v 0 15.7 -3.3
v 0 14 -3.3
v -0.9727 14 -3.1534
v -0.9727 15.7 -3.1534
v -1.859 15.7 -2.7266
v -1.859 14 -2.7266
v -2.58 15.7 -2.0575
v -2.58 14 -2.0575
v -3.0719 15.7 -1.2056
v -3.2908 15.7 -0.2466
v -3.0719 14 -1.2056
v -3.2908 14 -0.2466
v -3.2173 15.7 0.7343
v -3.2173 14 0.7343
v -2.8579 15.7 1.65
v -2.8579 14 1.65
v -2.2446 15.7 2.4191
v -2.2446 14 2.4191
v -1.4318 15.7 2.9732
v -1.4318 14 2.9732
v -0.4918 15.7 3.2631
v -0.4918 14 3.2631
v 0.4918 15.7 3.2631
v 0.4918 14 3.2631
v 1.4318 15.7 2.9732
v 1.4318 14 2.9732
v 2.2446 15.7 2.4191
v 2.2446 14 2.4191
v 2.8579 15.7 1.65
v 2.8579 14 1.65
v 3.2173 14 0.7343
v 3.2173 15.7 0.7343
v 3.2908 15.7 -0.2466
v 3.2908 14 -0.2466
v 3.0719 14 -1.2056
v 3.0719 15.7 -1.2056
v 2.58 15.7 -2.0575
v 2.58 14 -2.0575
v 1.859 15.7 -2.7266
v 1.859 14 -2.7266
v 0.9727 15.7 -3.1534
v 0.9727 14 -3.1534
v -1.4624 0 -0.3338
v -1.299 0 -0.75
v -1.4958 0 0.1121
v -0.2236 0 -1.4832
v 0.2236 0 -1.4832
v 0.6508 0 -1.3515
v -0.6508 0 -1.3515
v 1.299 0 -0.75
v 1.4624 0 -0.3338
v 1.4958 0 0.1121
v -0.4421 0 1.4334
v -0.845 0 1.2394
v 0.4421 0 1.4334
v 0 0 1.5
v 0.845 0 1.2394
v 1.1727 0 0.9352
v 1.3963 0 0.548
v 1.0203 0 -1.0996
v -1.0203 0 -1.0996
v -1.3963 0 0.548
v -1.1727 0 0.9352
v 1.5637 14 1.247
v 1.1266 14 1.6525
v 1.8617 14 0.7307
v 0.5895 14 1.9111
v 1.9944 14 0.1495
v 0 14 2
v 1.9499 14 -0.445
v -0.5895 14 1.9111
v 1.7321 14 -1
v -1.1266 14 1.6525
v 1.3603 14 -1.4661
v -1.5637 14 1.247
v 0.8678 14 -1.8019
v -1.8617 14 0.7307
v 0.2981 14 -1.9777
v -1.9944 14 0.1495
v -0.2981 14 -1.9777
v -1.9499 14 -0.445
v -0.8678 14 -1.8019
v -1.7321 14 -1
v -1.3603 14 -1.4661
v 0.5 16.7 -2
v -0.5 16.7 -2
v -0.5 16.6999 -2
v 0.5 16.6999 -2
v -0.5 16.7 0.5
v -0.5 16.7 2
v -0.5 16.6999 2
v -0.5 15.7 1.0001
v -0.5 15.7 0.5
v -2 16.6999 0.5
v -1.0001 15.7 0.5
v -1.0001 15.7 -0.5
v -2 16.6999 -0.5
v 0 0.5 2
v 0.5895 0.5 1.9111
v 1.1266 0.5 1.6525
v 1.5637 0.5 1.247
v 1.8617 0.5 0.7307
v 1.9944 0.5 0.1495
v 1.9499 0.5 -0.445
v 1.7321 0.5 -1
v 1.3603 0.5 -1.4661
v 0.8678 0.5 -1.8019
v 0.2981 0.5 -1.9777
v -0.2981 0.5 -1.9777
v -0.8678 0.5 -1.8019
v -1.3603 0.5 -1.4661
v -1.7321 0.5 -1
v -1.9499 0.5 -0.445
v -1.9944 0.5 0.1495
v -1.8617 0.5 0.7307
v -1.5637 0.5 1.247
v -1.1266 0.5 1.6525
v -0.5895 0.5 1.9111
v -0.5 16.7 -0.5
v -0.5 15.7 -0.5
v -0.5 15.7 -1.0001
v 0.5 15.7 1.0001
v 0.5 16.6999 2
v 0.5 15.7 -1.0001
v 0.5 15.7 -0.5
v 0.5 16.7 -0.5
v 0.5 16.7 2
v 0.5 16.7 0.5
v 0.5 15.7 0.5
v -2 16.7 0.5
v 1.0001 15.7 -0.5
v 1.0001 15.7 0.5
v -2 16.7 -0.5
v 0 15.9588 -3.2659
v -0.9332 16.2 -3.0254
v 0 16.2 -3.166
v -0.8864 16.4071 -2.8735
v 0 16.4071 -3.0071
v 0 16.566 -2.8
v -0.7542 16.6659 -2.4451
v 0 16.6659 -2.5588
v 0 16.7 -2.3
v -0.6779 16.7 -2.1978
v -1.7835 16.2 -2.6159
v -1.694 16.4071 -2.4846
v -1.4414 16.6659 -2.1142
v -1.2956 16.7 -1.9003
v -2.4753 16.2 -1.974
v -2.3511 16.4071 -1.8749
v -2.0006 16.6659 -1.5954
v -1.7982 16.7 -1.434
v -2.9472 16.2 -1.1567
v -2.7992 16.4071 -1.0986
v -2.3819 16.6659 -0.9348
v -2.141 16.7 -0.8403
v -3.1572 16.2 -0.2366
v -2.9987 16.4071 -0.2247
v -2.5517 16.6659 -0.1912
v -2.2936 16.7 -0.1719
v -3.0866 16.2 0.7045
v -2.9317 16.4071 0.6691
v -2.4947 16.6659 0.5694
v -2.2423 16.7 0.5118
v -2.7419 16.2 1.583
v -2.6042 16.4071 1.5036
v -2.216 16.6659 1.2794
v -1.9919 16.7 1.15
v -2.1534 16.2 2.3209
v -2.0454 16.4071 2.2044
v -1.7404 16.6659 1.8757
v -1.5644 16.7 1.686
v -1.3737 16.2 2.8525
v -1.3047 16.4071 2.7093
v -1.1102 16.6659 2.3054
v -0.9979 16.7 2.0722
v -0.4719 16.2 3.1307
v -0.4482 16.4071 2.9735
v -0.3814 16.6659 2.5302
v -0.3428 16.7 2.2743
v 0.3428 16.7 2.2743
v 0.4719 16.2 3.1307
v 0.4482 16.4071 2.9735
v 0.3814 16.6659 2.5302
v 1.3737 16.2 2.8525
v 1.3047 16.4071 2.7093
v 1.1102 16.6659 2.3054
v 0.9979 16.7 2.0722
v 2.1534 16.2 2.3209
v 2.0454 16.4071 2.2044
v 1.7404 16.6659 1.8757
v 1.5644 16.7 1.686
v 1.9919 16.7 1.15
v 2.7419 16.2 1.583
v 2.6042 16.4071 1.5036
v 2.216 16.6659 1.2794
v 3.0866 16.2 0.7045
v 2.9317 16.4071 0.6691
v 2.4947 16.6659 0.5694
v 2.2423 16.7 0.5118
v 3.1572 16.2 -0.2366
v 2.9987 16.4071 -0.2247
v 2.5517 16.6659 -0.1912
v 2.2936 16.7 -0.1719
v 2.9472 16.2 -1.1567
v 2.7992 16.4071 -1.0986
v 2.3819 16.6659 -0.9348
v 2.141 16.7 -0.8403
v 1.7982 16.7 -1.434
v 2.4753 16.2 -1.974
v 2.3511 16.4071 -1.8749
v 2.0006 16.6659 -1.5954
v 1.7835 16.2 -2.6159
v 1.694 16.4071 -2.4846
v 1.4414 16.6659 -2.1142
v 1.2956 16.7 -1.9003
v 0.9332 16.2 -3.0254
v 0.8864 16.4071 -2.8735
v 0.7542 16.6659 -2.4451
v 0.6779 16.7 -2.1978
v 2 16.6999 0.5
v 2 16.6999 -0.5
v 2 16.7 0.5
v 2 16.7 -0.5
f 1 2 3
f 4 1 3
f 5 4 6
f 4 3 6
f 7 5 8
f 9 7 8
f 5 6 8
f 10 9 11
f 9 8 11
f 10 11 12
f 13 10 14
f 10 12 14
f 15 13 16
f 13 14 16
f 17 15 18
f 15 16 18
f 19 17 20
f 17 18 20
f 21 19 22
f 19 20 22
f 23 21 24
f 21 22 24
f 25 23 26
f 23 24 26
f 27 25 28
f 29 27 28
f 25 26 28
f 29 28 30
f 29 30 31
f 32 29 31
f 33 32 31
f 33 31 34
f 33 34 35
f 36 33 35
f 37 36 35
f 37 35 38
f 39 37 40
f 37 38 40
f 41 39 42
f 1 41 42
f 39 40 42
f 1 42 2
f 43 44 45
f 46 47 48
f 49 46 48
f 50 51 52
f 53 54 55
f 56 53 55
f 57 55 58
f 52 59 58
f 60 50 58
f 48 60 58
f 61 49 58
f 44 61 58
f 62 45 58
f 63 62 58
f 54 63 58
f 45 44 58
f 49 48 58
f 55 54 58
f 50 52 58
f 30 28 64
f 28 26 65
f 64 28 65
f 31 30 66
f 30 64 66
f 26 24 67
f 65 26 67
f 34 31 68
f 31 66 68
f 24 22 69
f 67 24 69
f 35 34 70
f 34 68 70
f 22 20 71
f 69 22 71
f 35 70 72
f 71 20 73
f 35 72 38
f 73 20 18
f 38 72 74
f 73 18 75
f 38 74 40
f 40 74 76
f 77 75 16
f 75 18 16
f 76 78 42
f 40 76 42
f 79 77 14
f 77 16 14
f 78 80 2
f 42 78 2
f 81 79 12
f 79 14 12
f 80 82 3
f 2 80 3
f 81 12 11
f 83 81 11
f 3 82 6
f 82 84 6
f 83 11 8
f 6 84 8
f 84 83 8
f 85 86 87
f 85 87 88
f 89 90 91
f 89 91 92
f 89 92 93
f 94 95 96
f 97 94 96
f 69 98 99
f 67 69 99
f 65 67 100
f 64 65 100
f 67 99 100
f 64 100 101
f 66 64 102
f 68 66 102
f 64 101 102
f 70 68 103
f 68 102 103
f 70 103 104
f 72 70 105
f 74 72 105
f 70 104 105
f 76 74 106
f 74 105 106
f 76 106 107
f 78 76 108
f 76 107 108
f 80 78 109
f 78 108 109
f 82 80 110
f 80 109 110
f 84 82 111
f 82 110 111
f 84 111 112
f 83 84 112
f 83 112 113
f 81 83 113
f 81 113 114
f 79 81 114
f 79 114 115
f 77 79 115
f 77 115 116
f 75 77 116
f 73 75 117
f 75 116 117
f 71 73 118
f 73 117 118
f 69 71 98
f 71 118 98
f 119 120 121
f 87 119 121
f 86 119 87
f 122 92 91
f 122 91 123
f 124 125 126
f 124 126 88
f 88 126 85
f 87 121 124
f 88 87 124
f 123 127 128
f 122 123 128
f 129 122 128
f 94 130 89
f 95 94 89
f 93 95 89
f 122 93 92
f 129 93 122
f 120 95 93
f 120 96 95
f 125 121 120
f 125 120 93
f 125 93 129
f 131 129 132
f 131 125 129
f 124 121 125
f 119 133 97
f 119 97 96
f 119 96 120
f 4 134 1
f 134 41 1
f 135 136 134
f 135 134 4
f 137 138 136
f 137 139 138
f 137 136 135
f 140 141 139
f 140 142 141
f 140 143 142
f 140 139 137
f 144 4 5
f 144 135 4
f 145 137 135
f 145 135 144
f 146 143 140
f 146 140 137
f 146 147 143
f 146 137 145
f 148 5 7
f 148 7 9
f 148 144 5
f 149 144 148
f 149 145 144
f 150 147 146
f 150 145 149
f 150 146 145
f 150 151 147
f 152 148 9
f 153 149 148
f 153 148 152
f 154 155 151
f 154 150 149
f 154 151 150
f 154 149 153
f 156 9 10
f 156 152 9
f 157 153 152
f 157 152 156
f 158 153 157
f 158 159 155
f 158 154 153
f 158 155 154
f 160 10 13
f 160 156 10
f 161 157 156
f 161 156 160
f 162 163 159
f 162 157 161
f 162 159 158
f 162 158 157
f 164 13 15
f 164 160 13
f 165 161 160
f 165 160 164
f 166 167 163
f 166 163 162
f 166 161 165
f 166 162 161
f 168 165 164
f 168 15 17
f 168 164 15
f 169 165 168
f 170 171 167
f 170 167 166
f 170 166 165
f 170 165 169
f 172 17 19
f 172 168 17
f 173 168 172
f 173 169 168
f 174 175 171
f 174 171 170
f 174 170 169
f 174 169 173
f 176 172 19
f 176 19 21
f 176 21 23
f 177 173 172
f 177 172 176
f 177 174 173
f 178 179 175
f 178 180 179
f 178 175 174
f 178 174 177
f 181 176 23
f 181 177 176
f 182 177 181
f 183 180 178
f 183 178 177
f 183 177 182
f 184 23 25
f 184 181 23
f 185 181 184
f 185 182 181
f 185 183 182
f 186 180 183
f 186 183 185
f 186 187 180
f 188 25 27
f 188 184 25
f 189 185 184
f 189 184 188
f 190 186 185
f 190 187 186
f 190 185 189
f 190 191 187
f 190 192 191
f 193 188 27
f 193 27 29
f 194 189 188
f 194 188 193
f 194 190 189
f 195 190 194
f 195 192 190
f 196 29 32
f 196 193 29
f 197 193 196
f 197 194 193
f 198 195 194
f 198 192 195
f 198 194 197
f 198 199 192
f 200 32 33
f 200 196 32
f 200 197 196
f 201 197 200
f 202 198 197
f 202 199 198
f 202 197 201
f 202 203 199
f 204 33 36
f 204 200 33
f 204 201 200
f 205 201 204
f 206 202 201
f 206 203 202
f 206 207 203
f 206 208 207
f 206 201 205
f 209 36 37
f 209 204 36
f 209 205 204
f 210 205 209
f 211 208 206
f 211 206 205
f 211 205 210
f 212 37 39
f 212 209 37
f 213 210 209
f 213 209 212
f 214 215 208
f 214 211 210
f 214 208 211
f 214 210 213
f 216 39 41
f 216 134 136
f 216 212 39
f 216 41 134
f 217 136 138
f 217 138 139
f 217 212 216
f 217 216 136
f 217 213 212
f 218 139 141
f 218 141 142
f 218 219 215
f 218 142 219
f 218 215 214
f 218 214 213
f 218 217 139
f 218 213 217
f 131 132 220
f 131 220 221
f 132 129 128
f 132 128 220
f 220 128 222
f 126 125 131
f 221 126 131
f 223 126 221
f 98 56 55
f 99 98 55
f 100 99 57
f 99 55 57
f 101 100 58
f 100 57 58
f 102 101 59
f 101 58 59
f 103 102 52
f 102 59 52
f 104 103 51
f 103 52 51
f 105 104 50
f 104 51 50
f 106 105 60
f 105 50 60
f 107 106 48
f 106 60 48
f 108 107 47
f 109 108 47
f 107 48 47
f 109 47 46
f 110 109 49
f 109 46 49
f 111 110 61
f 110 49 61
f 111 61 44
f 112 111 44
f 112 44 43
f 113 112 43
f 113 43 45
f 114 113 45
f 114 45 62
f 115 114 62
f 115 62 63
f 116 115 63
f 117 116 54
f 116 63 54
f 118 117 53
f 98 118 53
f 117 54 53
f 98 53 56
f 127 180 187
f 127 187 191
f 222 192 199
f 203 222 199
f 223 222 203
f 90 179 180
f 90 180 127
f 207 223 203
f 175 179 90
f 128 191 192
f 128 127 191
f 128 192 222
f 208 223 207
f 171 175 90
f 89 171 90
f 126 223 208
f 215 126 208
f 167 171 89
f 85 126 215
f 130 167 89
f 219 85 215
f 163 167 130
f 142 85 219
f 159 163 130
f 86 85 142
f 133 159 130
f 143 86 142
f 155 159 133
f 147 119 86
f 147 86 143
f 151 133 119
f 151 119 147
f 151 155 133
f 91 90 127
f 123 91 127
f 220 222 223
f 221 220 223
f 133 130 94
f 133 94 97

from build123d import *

# Parameters (mm, degrees)
SKETCH_1_R          = 2
EXTRUDE_1_DEPTH     = 14
SKETCH_2_R          = 3.3
EXTRUDE_2_DEPTH     = 2.7
FILLET_1_R          = 1
CHAMFER_1_SIZE      = 0.5
SKETCH_3_W          = 4
SKETCH_3_H          = 1
SKETCH_3_W_2        = 1
SKETCH_3_H_2        = 4
CUT_EXTRUDE_1_DEPTH = 1
CHAMFER_2_SIZE      = 1


with BuildPart() as part:
    # 草图1 → 凸台-拉伸1 (new body)
    with BuildSketch(Plane(origin=(0, 0, 0), x_dir=(1, 0, 0), z_dir=(0, 1, 0))):
        with Locations(Location((0, 0, 0), (0, 0, 270))):
            Circle(SKETCH_1_R)
    extrude(amount=EXTRUDE_1_DEPTH)

    # 草图2 → 凸台-拉伸2 (add)
    with BuildSketch(Plane(origin=(0, 14, 0), x_dir=(1, 0, 0), z_dir=(0, 1, 0))):
        with Locations(Location((0, 0, 0), (0, 0, 90))):
            Circle(SKETCH_2_R)
    extrude(amount=EXTRUDE_2_DEPTH)

    # 圆角1
    fillet_1_edges = [part.edges().sort_by_distance(p)[0] for p in [
        (0, 16.7, 3.3),
    ]]
    fillet(fillet_1_edges, radius=FILLET_1_R)

    # 倒角1
    chamfer_1_edges = [part.edges().sort_by_distance(p)[0] for p in [
        (0, 0, -2),
    ]]
    chamfer(chamfer_1_edges, length=CHAMFER_1_SIZE)

    # 草图3 → 切除-拉伸-薄壁1 (cut)
    with BuildSketch(Plane(origin=(0, 16.7, 0), x_dir=(1, 0, 0), z_dir=(0, 1, 0))):
        Rectangle(SKETCH_3_W, SKETCH_3_H)
        Rectangle(SKETCH_3_W_2, SKETCH_3_H_2)
    extrude(amount=-CUT_EXTRUDE_1_DEPTH, mode=Mode.SUBTRACT)

    # 倒角2
    chamfer_2_edges = [part.edges().sort_by_distance(p)[0] for p in [
        (0, 15.7, 2),
        (2, 15.7, 0),
        (0, 15.7, -2),
        (-2, 15.7, 0),
    ]]
    chamfer(chamfer_2_edges, length=CHAMFER_2_SIZE - 0.0001)  # a hair under: the kernel refuses the full size


solid = part.part
